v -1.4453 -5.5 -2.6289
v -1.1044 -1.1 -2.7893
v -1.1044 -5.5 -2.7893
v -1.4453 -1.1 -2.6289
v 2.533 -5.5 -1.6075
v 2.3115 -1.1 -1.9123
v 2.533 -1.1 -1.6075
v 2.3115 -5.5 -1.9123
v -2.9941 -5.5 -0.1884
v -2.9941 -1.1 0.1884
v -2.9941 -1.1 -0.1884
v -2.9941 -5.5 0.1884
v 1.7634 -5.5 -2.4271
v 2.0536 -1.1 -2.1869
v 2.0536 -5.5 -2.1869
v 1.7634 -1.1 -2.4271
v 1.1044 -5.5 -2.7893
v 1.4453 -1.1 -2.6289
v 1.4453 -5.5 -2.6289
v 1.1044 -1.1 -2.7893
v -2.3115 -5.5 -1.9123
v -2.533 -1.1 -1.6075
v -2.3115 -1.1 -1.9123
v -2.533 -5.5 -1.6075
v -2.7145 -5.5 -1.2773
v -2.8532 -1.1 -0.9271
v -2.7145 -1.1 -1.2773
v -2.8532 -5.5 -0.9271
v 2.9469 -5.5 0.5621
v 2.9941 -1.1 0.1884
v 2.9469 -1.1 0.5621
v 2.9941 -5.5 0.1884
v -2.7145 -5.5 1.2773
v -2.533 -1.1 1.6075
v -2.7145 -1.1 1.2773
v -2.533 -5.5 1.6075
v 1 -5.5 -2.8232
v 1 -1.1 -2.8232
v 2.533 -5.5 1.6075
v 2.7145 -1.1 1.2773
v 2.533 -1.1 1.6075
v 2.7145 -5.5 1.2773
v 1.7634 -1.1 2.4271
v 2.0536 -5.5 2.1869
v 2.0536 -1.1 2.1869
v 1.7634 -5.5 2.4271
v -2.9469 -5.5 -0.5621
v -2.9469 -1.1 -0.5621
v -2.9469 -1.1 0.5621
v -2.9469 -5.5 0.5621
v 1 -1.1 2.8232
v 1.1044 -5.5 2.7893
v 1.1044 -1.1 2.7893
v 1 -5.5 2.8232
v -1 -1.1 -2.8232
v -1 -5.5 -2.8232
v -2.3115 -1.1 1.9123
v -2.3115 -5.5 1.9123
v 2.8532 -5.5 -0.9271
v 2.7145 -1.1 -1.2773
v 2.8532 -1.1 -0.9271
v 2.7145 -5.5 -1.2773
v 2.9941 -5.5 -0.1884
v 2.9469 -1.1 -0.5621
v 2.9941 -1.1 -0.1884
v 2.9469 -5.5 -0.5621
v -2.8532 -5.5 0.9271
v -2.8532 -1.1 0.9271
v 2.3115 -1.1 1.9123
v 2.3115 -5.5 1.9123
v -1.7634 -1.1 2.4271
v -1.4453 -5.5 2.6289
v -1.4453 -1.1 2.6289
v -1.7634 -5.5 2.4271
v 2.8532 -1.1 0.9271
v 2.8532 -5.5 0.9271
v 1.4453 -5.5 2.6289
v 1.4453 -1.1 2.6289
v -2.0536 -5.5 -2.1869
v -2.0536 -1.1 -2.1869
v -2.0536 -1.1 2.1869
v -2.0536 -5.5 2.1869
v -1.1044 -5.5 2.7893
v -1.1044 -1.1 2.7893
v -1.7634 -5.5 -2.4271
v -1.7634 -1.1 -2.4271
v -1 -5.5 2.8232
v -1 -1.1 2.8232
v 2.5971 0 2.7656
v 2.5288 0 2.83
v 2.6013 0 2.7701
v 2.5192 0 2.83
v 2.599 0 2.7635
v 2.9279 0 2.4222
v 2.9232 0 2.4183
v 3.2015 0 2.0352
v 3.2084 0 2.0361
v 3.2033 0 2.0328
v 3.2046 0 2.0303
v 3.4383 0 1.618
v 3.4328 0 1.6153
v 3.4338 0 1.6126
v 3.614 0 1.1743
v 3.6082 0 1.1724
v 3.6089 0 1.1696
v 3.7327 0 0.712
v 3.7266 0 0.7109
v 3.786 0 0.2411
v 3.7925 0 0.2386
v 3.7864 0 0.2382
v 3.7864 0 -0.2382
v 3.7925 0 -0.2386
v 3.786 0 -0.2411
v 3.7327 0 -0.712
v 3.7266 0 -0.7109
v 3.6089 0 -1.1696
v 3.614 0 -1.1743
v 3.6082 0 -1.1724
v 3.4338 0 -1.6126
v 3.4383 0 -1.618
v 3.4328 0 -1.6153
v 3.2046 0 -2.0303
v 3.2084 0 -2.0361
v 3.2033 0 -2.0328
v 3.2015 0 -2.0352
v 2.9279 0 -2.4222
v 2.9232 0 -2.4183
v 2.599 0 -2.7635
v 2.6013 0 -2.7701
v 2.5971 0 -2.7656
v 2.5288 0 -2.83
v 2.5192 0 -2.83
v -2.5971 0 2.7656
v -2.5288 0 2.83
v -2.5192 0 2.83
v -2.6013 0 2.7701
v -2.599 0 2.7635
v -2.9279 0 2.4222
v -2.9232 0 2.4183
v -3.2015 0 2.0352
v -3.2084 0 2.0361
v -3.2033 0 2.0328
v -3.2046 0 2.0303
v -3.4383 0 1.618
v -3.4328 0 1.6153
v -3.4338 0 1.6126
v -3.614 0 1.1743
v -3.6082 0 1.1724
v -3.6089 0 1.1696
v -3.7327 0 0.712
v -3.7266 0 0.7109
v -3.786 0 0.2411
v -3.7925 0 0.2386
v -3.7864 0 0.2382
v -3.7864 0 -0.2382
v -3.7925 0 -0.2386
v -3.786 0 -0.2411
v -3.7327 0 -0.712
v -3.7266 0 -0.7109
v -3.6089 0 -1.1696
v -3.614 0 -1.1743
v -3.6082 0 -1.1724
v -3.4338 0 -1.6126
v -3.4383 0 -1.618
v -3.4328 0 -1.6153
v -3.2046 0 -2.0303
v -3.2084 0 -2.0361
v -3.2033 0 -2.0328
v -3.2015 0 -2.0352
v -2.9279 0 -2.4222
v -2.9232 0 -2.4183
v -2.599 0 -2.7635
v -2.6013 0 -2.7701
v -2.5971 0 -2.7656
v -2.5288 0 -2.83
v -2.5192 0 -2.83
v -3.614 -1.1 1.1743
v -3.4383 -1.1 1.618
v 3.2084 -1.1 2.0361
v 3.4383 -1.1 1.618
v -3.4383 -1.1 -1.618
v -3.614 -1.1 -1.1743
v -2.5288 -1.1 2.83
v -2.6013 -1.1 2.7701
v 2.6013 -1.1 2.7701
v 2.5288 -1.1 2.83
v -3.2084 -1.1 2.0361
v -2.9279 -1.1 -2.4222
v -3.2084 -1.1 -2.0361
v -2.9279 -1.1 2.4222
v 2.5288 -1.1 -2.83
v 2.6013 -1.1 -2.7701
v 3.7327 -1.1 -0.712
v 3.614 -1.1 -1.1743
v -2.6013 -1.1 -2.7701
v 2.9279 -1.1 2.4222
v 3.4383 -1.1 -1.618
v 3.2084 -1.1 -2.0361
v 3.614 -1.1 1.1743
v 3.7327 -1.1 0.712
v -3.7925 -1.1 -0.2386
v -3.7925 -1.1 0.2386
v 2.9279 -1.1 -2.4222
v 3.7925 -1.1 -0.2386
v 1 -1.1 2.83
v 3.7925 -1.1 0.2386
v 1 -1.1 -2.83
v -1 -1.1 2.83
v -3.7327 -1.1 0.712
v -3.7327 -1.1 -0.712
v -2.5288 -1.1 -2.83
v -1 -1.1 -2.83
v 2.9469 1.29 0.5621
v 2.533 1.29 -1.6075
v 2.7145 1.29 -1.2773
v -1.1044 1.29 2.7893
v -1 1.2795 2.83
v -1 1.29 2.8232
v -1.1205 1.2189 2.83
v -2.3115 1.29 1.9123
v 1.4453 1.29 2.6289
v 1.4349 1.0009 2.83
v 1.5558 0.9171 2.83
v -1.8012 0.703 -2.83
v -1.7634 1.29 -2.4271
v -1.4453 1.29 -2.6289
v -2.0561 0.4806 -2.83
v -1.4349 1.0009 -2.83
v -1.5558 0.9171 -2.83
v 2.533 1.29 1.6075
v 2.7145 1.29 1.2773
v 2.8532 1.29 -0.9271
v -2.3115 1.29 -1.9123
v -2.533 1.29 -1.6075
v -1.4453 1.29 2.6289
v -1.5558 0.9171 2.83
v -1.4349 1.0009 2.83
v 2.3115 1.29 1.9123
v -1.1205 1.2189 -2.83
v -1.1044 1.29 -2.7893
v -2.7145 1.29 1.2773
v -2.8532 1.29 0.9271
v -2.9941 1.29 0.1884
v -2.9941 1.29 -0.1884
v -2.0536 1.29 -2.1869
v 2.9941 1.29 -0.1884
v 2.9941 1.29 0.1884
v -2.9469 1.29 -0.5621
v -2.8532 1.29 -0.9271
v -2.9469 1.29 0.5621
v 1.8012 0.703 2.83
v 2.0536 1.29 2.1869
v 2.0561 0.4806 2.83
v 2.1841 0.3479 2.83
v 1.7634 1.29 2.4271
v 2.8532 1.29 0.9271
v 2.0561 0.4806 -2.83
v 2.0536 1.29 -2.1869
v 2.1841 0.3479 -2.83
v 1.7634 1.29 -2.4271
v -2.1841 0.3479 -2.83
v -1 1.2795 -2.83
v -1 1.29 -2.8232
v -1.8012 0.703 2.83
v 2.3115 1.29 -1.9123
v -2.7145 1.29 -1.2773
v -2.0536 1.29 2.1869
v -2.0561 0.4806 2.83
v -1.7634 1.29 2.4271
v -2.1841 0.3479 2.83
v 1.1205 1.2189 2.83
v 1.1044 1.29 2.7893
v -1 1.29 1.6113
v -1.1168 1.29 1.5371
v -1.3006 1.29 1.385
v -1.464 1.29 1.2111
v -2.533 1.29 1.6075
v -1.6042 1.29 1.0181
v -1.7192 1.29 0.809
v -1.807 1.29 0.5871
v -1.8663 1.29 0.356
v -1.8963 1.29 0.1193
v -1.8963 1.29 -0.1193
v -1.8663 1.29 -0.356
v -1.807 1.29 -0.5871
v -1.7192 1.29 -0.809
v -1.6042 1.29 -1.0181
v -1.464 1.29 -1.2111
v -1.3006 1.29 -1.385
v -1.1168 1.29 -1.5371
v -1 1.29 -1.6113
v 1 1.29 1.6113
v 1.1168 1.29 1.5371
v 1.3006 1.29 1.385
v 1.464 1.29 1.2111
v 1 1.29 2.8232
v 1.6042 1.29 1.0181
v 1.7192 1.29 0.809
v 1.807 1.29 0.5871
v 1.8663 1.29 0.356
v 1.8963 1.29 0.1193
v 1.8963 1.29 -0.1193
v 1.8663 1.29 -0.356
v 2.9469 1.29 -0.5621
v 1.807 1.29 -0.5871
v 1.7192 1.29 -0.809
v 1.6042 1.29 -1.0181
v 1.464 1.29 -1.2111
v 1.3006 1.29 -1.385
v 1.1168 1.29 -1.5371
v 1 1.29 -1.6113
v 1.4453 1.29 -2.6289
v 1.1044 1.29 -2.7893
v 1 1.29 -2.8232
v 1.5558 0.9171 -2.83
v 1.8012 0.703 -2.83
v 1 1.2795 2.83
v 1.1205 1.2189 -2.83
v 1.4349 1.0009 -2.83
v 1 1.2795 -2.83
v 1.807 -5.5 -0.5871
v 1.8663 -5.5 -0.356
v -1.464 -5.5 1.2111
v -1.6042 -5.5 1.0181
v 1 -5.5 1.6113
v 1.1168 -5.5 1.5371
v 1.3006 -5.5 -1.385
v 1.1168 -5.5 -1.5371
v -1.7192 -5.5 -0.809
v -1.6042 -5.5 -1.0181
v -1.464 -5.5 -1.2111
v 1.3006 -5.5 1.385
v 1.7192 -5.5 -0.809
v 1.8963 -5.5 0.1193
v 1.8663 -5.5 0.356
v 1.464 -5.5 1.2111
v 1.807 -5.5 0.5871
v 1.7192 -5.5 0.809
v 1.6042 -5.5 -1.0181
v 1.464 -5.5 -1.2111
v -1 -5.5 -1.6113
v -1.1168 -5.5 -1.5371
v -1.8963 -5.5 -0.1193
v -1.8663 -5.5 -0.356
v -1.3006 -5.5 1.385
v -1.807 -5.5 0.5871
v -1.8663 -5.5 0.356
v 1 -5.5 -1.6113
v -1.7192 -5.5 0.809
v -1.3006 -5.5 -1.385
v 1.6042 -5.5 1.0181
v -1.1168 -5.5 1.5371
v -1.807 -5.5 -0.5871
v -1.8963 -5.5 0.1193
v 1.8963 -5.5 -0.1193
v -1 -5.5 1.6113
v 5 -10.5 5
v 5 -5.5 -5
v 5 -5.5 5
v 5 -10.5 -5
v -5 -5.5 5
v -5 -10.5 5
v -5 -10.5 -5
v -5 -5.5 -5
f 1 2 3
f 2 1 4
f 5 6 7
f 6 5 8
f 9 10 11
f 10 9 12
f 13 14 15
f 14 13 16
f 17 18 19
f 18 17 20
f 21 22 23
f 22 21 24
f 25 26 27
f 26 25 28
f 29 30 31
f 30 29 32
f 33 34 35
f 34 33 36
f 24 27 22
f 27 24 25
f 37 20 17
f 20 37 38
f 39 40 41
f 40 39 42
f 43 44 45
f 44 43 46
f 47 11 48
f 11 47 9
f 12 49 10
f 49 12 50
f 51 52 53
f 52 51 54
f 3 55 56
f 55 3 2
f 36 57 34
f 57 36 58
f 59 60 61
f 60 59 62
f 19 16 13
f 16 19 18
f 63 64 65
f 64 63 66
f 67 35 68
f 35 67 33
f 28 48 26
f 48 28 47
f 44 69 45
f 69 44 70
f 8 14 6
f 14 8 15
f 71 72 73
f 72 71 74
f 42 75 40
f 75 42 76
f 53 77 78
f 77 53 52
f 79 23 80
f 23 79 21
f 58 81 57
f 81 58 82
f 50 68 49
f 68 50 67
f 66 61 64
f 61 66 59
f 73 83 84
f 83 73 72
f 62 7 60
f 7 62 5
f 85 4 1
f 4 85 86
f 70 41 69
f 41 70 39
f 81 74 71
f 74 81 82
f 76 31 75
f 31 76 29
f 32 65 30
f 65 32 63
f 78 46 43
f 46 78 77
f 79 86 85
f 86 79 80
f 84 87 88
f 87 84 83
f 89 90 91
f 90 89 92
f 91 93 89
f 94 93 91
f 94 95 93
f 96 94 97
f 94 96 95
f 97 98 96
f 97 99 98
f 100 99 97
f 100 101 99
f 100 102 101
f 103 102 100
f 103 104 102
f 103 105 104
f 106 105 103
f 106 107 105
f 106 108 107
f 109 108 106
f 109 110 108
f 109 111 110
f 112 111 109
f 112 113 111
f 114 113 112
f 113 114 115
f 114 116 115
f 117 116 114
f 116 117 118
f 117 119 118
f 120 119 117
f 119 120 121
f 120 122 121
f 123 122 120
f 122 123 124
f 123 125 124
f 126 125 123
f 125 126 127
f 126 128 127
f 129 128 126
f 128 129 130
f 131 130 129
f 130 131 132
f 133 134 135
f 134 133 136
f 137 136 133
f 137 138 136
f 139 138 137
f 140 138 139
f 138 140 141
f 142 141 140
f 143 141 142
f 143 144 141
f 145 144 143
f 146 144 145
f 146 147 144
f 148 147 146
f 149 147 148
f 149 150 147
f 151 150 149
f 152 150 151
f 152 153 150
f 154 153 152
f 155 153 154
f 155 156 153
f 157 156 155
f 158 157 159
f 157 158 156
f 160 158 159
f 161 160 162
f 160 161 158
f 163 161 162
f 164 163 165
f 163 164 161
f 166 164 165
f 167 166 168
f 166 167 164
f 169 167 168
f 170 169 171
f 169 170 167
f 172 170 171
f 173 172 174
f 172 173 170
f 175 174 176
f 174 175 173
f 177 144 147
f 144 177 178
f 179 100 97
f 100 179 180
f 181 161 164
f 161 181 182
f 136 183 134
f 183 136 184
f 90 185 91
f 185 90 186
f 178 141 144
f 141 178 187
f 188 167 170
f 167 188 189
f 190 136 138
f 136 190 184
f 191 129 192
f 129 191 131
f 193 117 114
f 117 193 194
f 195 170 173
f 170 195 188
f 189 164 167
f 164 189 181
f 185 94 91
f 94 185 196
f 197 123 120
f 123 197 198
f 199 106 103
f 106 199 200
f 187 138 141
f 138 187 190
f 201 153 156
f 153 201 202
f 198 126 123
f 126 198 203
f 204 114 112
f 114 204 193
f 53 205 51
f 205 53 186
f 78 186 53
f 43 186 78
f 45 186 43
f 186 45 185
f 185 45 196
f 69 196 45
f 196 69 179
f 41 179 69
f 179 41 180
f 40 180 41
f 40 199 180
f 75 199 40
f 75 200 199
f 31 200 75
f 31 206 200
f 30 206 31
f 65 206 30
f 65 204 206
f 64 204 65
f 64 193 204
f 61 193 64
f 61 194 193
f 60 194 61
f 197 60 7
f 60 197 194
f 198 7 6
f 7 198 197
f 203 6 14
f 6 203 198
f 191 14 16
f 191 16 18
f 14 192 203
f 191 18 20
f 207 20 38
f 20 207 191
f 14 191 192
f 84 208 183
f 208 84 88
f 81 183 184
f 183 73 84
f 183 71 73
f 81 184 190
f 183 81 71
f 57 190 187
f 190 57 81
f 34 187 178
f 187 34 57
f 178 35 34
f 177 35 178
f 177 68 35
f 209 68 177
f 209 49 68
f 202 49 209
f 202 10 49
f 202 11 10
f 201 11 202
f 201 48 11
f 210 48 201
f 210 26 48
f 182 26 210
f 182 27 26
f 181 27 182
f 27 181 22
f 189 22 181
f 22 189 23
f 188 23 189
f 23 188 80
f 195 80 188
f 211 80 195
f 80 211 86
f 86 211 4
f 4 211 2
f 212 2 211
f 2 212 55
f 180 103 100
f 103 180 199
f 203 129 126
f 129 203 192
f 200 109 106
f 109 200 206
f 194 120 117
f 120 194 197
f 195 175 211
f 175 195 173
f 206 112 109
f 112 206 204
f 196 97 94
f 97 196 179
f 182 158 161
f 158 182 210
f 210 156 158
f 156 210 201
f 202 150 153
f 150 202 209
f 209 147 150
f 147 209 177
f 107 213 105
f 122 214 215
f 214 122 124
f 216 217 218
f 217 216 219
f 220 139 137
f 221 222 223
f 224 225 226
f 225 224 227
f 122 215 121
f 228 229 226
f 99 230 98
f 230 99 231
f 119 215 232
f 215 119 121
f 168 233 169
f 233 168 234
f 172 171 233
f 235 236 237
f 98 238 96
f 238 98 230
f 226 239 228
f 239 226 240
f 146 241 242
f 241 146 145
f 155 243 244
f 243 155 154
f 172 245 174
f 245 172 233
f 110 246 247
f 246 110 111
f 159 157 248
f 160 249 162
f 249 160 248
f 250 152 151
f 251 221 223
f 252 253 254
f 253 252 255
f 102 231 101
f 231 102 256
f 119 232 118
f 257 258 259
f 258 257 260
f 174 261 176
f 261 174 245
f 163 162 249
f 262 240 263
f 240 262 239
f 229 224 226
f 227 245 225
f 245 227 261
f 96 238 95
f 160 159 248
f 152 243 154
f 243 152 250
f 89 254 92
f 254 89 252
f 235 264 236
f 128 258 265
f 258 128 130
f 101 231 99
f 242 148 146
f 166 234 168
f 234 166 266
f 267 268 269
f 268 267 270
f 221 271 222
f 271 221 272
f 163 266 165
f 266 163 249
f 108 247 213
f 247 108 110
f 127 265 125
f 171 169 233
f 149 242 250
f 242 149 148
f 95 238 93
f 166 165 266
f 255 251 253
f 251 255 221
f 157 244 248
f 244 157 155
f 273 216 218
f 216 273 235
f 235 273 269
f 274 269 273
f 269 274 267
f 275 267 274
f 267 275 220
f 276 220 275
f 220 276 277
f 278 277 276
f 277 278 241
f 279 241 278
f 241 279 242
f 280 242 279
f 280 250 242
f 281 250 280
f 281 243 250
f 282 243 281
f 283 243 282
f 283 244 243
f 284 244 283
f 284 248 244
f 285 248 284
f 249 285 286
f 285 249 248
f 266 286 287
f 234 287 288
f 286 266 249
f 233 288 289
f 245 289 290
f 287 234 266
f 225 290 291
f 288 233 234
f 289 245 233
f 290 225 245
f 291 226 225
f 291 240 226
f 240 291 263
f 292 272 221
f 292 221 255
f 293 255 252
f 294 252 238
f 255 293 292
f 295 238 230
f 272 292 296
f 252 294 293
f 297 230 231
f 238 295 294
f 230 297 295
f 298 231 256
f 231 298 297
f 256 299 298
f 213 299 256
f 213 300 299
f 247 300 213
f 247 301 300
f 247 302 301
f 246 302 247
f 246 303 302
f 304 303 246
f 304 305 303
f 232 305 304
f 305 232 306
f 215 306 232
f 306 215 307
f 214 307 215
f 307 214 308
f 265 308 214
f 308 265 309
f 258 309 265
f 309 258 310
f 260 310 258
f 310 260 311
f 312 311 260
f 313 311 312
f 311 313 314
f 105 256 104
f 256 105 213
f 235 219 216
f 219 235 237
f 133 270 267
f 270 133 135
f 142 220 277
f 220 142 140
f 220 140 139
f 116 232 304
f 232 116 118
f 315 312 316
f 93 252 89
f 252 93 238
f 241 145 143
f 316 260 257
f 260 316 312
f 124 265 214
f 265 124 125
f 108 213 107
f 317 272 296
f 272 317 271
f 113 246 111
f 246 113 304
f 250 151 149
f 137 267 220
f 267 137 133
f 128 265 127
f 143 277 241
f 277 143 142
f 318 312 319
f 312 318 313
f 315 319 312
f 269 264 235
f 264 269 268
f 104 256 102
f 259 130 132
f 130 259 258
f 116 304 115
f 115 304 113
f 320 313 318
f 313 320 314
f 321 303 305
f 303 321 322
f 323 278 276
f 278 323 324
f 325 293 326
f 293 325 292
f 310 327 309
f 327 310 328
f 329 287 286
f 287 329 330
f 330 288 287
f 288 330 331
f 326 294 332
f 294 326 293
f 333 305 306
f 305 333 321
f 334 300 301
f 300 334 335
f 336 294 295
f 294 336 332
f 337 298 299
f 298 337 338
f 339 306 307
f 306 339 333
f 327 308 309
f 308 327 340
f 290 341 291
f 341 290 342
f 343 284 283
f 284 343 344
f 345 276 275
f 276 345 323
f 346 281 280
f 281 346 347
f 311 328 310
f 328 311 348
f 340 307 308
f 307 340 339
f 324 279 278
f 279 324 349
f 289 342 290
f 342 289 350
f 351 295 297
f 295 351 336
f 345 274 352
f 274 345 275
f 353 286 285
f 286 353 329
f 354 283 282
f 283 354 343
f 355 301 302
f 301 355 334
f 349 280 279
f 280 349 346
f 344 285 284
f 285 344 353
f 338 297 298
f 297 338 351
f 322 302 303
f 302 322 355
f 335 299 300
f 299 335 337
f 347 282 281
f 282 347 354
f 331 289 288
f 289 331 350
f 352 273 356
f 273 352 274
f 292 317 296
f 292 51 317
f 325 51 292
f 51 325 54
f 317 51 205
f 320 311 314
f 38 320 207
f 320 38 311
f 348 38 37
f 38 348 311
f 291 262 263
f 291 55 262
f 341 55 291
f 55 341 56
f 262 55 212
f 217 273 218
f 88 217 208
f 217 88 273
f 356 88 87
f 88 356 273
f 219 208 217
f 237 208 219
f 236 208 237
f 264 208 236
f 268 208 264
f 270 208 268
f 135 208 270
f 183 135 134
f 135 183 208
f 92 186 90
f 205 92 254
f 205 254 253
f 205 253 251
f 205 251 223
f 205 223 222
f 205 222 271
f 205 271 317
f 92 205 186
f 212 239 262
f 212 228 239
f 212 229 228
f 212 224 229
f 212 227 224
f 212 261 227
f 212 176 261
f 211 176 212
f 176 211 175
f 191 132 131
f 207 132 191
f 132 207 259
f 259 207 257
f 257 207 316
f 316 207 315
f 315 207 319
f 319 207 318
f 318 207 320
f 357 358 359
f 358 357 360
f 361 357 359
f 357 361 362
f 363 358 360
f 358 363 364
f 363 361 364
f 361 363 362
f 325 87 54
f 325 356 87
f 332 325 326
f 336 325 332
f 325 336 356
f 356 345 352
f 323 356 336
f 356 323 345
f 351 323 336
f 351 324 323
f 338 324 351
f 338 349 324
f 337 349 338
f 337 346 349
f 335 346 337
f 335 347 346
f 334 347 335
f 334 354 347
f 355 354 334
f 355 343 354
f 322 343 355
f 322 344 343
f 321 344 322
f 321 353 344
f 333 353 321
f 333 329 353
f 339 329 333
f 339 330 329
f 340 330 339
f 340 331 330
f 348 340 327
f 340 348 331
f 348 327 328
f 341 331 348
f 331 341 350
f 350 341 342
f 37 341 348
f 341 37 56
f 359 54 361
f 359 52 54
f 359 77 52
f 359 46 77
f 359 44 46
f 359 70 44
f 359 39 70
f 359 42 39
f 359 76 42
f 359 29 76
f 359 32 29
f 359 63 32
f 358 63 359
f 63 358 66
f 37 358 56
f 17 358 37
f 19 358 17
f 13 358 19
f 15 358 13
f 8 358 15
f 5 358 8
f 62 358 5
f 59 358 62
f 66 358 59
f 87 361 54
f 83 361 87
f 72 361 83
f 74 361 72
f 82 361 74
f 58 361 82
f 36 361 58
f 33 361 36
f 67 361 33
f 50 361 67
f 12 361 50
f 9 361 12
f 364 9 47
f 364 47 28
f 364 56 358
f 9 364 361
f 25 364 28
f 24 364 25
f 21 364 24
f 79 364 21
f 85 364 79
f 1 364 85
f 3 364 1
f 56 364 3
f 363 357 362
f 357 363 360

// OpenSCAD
module wheel_plug() {
    difference() {
        union() {
            color("blue") rotate([90,90,0]) cylinder(h=9, r1=3, r2=3, $fn=50);
            color("gray") rotate([90,90,0]) cylinder(h=1.1, r1=3.8, r2=3.8, $fn=50);
            translate([0,1.29,0])rotate([90,90,0]) cylinder(h=1.3, r1=3, r2=3.8, $fn=50);
        }
        color("red") translate([0, 5, 0]) rotate([90,90,0]) cylinder(h=20, r1=1.9, r2=1.9, $fn=50);
        color("green") translate([0, -5, 0]) cube(size=[2, 13, 10], center=true);
        color("pink") translate([0, -1, 3.83]) rotate([0,90,0]) cube(size=[2, 5, 10], center=true);
        mirror([0, 0, 1]) 
        translate([0, -1, 3.83]) rotate([0,90,0]) cube(size=[2, 5, 10], center=true);
    }
}
wheel_plug();
translate([0, -8, 0]) {
 cube(size=[10, 5, 10], center=true);
}    
